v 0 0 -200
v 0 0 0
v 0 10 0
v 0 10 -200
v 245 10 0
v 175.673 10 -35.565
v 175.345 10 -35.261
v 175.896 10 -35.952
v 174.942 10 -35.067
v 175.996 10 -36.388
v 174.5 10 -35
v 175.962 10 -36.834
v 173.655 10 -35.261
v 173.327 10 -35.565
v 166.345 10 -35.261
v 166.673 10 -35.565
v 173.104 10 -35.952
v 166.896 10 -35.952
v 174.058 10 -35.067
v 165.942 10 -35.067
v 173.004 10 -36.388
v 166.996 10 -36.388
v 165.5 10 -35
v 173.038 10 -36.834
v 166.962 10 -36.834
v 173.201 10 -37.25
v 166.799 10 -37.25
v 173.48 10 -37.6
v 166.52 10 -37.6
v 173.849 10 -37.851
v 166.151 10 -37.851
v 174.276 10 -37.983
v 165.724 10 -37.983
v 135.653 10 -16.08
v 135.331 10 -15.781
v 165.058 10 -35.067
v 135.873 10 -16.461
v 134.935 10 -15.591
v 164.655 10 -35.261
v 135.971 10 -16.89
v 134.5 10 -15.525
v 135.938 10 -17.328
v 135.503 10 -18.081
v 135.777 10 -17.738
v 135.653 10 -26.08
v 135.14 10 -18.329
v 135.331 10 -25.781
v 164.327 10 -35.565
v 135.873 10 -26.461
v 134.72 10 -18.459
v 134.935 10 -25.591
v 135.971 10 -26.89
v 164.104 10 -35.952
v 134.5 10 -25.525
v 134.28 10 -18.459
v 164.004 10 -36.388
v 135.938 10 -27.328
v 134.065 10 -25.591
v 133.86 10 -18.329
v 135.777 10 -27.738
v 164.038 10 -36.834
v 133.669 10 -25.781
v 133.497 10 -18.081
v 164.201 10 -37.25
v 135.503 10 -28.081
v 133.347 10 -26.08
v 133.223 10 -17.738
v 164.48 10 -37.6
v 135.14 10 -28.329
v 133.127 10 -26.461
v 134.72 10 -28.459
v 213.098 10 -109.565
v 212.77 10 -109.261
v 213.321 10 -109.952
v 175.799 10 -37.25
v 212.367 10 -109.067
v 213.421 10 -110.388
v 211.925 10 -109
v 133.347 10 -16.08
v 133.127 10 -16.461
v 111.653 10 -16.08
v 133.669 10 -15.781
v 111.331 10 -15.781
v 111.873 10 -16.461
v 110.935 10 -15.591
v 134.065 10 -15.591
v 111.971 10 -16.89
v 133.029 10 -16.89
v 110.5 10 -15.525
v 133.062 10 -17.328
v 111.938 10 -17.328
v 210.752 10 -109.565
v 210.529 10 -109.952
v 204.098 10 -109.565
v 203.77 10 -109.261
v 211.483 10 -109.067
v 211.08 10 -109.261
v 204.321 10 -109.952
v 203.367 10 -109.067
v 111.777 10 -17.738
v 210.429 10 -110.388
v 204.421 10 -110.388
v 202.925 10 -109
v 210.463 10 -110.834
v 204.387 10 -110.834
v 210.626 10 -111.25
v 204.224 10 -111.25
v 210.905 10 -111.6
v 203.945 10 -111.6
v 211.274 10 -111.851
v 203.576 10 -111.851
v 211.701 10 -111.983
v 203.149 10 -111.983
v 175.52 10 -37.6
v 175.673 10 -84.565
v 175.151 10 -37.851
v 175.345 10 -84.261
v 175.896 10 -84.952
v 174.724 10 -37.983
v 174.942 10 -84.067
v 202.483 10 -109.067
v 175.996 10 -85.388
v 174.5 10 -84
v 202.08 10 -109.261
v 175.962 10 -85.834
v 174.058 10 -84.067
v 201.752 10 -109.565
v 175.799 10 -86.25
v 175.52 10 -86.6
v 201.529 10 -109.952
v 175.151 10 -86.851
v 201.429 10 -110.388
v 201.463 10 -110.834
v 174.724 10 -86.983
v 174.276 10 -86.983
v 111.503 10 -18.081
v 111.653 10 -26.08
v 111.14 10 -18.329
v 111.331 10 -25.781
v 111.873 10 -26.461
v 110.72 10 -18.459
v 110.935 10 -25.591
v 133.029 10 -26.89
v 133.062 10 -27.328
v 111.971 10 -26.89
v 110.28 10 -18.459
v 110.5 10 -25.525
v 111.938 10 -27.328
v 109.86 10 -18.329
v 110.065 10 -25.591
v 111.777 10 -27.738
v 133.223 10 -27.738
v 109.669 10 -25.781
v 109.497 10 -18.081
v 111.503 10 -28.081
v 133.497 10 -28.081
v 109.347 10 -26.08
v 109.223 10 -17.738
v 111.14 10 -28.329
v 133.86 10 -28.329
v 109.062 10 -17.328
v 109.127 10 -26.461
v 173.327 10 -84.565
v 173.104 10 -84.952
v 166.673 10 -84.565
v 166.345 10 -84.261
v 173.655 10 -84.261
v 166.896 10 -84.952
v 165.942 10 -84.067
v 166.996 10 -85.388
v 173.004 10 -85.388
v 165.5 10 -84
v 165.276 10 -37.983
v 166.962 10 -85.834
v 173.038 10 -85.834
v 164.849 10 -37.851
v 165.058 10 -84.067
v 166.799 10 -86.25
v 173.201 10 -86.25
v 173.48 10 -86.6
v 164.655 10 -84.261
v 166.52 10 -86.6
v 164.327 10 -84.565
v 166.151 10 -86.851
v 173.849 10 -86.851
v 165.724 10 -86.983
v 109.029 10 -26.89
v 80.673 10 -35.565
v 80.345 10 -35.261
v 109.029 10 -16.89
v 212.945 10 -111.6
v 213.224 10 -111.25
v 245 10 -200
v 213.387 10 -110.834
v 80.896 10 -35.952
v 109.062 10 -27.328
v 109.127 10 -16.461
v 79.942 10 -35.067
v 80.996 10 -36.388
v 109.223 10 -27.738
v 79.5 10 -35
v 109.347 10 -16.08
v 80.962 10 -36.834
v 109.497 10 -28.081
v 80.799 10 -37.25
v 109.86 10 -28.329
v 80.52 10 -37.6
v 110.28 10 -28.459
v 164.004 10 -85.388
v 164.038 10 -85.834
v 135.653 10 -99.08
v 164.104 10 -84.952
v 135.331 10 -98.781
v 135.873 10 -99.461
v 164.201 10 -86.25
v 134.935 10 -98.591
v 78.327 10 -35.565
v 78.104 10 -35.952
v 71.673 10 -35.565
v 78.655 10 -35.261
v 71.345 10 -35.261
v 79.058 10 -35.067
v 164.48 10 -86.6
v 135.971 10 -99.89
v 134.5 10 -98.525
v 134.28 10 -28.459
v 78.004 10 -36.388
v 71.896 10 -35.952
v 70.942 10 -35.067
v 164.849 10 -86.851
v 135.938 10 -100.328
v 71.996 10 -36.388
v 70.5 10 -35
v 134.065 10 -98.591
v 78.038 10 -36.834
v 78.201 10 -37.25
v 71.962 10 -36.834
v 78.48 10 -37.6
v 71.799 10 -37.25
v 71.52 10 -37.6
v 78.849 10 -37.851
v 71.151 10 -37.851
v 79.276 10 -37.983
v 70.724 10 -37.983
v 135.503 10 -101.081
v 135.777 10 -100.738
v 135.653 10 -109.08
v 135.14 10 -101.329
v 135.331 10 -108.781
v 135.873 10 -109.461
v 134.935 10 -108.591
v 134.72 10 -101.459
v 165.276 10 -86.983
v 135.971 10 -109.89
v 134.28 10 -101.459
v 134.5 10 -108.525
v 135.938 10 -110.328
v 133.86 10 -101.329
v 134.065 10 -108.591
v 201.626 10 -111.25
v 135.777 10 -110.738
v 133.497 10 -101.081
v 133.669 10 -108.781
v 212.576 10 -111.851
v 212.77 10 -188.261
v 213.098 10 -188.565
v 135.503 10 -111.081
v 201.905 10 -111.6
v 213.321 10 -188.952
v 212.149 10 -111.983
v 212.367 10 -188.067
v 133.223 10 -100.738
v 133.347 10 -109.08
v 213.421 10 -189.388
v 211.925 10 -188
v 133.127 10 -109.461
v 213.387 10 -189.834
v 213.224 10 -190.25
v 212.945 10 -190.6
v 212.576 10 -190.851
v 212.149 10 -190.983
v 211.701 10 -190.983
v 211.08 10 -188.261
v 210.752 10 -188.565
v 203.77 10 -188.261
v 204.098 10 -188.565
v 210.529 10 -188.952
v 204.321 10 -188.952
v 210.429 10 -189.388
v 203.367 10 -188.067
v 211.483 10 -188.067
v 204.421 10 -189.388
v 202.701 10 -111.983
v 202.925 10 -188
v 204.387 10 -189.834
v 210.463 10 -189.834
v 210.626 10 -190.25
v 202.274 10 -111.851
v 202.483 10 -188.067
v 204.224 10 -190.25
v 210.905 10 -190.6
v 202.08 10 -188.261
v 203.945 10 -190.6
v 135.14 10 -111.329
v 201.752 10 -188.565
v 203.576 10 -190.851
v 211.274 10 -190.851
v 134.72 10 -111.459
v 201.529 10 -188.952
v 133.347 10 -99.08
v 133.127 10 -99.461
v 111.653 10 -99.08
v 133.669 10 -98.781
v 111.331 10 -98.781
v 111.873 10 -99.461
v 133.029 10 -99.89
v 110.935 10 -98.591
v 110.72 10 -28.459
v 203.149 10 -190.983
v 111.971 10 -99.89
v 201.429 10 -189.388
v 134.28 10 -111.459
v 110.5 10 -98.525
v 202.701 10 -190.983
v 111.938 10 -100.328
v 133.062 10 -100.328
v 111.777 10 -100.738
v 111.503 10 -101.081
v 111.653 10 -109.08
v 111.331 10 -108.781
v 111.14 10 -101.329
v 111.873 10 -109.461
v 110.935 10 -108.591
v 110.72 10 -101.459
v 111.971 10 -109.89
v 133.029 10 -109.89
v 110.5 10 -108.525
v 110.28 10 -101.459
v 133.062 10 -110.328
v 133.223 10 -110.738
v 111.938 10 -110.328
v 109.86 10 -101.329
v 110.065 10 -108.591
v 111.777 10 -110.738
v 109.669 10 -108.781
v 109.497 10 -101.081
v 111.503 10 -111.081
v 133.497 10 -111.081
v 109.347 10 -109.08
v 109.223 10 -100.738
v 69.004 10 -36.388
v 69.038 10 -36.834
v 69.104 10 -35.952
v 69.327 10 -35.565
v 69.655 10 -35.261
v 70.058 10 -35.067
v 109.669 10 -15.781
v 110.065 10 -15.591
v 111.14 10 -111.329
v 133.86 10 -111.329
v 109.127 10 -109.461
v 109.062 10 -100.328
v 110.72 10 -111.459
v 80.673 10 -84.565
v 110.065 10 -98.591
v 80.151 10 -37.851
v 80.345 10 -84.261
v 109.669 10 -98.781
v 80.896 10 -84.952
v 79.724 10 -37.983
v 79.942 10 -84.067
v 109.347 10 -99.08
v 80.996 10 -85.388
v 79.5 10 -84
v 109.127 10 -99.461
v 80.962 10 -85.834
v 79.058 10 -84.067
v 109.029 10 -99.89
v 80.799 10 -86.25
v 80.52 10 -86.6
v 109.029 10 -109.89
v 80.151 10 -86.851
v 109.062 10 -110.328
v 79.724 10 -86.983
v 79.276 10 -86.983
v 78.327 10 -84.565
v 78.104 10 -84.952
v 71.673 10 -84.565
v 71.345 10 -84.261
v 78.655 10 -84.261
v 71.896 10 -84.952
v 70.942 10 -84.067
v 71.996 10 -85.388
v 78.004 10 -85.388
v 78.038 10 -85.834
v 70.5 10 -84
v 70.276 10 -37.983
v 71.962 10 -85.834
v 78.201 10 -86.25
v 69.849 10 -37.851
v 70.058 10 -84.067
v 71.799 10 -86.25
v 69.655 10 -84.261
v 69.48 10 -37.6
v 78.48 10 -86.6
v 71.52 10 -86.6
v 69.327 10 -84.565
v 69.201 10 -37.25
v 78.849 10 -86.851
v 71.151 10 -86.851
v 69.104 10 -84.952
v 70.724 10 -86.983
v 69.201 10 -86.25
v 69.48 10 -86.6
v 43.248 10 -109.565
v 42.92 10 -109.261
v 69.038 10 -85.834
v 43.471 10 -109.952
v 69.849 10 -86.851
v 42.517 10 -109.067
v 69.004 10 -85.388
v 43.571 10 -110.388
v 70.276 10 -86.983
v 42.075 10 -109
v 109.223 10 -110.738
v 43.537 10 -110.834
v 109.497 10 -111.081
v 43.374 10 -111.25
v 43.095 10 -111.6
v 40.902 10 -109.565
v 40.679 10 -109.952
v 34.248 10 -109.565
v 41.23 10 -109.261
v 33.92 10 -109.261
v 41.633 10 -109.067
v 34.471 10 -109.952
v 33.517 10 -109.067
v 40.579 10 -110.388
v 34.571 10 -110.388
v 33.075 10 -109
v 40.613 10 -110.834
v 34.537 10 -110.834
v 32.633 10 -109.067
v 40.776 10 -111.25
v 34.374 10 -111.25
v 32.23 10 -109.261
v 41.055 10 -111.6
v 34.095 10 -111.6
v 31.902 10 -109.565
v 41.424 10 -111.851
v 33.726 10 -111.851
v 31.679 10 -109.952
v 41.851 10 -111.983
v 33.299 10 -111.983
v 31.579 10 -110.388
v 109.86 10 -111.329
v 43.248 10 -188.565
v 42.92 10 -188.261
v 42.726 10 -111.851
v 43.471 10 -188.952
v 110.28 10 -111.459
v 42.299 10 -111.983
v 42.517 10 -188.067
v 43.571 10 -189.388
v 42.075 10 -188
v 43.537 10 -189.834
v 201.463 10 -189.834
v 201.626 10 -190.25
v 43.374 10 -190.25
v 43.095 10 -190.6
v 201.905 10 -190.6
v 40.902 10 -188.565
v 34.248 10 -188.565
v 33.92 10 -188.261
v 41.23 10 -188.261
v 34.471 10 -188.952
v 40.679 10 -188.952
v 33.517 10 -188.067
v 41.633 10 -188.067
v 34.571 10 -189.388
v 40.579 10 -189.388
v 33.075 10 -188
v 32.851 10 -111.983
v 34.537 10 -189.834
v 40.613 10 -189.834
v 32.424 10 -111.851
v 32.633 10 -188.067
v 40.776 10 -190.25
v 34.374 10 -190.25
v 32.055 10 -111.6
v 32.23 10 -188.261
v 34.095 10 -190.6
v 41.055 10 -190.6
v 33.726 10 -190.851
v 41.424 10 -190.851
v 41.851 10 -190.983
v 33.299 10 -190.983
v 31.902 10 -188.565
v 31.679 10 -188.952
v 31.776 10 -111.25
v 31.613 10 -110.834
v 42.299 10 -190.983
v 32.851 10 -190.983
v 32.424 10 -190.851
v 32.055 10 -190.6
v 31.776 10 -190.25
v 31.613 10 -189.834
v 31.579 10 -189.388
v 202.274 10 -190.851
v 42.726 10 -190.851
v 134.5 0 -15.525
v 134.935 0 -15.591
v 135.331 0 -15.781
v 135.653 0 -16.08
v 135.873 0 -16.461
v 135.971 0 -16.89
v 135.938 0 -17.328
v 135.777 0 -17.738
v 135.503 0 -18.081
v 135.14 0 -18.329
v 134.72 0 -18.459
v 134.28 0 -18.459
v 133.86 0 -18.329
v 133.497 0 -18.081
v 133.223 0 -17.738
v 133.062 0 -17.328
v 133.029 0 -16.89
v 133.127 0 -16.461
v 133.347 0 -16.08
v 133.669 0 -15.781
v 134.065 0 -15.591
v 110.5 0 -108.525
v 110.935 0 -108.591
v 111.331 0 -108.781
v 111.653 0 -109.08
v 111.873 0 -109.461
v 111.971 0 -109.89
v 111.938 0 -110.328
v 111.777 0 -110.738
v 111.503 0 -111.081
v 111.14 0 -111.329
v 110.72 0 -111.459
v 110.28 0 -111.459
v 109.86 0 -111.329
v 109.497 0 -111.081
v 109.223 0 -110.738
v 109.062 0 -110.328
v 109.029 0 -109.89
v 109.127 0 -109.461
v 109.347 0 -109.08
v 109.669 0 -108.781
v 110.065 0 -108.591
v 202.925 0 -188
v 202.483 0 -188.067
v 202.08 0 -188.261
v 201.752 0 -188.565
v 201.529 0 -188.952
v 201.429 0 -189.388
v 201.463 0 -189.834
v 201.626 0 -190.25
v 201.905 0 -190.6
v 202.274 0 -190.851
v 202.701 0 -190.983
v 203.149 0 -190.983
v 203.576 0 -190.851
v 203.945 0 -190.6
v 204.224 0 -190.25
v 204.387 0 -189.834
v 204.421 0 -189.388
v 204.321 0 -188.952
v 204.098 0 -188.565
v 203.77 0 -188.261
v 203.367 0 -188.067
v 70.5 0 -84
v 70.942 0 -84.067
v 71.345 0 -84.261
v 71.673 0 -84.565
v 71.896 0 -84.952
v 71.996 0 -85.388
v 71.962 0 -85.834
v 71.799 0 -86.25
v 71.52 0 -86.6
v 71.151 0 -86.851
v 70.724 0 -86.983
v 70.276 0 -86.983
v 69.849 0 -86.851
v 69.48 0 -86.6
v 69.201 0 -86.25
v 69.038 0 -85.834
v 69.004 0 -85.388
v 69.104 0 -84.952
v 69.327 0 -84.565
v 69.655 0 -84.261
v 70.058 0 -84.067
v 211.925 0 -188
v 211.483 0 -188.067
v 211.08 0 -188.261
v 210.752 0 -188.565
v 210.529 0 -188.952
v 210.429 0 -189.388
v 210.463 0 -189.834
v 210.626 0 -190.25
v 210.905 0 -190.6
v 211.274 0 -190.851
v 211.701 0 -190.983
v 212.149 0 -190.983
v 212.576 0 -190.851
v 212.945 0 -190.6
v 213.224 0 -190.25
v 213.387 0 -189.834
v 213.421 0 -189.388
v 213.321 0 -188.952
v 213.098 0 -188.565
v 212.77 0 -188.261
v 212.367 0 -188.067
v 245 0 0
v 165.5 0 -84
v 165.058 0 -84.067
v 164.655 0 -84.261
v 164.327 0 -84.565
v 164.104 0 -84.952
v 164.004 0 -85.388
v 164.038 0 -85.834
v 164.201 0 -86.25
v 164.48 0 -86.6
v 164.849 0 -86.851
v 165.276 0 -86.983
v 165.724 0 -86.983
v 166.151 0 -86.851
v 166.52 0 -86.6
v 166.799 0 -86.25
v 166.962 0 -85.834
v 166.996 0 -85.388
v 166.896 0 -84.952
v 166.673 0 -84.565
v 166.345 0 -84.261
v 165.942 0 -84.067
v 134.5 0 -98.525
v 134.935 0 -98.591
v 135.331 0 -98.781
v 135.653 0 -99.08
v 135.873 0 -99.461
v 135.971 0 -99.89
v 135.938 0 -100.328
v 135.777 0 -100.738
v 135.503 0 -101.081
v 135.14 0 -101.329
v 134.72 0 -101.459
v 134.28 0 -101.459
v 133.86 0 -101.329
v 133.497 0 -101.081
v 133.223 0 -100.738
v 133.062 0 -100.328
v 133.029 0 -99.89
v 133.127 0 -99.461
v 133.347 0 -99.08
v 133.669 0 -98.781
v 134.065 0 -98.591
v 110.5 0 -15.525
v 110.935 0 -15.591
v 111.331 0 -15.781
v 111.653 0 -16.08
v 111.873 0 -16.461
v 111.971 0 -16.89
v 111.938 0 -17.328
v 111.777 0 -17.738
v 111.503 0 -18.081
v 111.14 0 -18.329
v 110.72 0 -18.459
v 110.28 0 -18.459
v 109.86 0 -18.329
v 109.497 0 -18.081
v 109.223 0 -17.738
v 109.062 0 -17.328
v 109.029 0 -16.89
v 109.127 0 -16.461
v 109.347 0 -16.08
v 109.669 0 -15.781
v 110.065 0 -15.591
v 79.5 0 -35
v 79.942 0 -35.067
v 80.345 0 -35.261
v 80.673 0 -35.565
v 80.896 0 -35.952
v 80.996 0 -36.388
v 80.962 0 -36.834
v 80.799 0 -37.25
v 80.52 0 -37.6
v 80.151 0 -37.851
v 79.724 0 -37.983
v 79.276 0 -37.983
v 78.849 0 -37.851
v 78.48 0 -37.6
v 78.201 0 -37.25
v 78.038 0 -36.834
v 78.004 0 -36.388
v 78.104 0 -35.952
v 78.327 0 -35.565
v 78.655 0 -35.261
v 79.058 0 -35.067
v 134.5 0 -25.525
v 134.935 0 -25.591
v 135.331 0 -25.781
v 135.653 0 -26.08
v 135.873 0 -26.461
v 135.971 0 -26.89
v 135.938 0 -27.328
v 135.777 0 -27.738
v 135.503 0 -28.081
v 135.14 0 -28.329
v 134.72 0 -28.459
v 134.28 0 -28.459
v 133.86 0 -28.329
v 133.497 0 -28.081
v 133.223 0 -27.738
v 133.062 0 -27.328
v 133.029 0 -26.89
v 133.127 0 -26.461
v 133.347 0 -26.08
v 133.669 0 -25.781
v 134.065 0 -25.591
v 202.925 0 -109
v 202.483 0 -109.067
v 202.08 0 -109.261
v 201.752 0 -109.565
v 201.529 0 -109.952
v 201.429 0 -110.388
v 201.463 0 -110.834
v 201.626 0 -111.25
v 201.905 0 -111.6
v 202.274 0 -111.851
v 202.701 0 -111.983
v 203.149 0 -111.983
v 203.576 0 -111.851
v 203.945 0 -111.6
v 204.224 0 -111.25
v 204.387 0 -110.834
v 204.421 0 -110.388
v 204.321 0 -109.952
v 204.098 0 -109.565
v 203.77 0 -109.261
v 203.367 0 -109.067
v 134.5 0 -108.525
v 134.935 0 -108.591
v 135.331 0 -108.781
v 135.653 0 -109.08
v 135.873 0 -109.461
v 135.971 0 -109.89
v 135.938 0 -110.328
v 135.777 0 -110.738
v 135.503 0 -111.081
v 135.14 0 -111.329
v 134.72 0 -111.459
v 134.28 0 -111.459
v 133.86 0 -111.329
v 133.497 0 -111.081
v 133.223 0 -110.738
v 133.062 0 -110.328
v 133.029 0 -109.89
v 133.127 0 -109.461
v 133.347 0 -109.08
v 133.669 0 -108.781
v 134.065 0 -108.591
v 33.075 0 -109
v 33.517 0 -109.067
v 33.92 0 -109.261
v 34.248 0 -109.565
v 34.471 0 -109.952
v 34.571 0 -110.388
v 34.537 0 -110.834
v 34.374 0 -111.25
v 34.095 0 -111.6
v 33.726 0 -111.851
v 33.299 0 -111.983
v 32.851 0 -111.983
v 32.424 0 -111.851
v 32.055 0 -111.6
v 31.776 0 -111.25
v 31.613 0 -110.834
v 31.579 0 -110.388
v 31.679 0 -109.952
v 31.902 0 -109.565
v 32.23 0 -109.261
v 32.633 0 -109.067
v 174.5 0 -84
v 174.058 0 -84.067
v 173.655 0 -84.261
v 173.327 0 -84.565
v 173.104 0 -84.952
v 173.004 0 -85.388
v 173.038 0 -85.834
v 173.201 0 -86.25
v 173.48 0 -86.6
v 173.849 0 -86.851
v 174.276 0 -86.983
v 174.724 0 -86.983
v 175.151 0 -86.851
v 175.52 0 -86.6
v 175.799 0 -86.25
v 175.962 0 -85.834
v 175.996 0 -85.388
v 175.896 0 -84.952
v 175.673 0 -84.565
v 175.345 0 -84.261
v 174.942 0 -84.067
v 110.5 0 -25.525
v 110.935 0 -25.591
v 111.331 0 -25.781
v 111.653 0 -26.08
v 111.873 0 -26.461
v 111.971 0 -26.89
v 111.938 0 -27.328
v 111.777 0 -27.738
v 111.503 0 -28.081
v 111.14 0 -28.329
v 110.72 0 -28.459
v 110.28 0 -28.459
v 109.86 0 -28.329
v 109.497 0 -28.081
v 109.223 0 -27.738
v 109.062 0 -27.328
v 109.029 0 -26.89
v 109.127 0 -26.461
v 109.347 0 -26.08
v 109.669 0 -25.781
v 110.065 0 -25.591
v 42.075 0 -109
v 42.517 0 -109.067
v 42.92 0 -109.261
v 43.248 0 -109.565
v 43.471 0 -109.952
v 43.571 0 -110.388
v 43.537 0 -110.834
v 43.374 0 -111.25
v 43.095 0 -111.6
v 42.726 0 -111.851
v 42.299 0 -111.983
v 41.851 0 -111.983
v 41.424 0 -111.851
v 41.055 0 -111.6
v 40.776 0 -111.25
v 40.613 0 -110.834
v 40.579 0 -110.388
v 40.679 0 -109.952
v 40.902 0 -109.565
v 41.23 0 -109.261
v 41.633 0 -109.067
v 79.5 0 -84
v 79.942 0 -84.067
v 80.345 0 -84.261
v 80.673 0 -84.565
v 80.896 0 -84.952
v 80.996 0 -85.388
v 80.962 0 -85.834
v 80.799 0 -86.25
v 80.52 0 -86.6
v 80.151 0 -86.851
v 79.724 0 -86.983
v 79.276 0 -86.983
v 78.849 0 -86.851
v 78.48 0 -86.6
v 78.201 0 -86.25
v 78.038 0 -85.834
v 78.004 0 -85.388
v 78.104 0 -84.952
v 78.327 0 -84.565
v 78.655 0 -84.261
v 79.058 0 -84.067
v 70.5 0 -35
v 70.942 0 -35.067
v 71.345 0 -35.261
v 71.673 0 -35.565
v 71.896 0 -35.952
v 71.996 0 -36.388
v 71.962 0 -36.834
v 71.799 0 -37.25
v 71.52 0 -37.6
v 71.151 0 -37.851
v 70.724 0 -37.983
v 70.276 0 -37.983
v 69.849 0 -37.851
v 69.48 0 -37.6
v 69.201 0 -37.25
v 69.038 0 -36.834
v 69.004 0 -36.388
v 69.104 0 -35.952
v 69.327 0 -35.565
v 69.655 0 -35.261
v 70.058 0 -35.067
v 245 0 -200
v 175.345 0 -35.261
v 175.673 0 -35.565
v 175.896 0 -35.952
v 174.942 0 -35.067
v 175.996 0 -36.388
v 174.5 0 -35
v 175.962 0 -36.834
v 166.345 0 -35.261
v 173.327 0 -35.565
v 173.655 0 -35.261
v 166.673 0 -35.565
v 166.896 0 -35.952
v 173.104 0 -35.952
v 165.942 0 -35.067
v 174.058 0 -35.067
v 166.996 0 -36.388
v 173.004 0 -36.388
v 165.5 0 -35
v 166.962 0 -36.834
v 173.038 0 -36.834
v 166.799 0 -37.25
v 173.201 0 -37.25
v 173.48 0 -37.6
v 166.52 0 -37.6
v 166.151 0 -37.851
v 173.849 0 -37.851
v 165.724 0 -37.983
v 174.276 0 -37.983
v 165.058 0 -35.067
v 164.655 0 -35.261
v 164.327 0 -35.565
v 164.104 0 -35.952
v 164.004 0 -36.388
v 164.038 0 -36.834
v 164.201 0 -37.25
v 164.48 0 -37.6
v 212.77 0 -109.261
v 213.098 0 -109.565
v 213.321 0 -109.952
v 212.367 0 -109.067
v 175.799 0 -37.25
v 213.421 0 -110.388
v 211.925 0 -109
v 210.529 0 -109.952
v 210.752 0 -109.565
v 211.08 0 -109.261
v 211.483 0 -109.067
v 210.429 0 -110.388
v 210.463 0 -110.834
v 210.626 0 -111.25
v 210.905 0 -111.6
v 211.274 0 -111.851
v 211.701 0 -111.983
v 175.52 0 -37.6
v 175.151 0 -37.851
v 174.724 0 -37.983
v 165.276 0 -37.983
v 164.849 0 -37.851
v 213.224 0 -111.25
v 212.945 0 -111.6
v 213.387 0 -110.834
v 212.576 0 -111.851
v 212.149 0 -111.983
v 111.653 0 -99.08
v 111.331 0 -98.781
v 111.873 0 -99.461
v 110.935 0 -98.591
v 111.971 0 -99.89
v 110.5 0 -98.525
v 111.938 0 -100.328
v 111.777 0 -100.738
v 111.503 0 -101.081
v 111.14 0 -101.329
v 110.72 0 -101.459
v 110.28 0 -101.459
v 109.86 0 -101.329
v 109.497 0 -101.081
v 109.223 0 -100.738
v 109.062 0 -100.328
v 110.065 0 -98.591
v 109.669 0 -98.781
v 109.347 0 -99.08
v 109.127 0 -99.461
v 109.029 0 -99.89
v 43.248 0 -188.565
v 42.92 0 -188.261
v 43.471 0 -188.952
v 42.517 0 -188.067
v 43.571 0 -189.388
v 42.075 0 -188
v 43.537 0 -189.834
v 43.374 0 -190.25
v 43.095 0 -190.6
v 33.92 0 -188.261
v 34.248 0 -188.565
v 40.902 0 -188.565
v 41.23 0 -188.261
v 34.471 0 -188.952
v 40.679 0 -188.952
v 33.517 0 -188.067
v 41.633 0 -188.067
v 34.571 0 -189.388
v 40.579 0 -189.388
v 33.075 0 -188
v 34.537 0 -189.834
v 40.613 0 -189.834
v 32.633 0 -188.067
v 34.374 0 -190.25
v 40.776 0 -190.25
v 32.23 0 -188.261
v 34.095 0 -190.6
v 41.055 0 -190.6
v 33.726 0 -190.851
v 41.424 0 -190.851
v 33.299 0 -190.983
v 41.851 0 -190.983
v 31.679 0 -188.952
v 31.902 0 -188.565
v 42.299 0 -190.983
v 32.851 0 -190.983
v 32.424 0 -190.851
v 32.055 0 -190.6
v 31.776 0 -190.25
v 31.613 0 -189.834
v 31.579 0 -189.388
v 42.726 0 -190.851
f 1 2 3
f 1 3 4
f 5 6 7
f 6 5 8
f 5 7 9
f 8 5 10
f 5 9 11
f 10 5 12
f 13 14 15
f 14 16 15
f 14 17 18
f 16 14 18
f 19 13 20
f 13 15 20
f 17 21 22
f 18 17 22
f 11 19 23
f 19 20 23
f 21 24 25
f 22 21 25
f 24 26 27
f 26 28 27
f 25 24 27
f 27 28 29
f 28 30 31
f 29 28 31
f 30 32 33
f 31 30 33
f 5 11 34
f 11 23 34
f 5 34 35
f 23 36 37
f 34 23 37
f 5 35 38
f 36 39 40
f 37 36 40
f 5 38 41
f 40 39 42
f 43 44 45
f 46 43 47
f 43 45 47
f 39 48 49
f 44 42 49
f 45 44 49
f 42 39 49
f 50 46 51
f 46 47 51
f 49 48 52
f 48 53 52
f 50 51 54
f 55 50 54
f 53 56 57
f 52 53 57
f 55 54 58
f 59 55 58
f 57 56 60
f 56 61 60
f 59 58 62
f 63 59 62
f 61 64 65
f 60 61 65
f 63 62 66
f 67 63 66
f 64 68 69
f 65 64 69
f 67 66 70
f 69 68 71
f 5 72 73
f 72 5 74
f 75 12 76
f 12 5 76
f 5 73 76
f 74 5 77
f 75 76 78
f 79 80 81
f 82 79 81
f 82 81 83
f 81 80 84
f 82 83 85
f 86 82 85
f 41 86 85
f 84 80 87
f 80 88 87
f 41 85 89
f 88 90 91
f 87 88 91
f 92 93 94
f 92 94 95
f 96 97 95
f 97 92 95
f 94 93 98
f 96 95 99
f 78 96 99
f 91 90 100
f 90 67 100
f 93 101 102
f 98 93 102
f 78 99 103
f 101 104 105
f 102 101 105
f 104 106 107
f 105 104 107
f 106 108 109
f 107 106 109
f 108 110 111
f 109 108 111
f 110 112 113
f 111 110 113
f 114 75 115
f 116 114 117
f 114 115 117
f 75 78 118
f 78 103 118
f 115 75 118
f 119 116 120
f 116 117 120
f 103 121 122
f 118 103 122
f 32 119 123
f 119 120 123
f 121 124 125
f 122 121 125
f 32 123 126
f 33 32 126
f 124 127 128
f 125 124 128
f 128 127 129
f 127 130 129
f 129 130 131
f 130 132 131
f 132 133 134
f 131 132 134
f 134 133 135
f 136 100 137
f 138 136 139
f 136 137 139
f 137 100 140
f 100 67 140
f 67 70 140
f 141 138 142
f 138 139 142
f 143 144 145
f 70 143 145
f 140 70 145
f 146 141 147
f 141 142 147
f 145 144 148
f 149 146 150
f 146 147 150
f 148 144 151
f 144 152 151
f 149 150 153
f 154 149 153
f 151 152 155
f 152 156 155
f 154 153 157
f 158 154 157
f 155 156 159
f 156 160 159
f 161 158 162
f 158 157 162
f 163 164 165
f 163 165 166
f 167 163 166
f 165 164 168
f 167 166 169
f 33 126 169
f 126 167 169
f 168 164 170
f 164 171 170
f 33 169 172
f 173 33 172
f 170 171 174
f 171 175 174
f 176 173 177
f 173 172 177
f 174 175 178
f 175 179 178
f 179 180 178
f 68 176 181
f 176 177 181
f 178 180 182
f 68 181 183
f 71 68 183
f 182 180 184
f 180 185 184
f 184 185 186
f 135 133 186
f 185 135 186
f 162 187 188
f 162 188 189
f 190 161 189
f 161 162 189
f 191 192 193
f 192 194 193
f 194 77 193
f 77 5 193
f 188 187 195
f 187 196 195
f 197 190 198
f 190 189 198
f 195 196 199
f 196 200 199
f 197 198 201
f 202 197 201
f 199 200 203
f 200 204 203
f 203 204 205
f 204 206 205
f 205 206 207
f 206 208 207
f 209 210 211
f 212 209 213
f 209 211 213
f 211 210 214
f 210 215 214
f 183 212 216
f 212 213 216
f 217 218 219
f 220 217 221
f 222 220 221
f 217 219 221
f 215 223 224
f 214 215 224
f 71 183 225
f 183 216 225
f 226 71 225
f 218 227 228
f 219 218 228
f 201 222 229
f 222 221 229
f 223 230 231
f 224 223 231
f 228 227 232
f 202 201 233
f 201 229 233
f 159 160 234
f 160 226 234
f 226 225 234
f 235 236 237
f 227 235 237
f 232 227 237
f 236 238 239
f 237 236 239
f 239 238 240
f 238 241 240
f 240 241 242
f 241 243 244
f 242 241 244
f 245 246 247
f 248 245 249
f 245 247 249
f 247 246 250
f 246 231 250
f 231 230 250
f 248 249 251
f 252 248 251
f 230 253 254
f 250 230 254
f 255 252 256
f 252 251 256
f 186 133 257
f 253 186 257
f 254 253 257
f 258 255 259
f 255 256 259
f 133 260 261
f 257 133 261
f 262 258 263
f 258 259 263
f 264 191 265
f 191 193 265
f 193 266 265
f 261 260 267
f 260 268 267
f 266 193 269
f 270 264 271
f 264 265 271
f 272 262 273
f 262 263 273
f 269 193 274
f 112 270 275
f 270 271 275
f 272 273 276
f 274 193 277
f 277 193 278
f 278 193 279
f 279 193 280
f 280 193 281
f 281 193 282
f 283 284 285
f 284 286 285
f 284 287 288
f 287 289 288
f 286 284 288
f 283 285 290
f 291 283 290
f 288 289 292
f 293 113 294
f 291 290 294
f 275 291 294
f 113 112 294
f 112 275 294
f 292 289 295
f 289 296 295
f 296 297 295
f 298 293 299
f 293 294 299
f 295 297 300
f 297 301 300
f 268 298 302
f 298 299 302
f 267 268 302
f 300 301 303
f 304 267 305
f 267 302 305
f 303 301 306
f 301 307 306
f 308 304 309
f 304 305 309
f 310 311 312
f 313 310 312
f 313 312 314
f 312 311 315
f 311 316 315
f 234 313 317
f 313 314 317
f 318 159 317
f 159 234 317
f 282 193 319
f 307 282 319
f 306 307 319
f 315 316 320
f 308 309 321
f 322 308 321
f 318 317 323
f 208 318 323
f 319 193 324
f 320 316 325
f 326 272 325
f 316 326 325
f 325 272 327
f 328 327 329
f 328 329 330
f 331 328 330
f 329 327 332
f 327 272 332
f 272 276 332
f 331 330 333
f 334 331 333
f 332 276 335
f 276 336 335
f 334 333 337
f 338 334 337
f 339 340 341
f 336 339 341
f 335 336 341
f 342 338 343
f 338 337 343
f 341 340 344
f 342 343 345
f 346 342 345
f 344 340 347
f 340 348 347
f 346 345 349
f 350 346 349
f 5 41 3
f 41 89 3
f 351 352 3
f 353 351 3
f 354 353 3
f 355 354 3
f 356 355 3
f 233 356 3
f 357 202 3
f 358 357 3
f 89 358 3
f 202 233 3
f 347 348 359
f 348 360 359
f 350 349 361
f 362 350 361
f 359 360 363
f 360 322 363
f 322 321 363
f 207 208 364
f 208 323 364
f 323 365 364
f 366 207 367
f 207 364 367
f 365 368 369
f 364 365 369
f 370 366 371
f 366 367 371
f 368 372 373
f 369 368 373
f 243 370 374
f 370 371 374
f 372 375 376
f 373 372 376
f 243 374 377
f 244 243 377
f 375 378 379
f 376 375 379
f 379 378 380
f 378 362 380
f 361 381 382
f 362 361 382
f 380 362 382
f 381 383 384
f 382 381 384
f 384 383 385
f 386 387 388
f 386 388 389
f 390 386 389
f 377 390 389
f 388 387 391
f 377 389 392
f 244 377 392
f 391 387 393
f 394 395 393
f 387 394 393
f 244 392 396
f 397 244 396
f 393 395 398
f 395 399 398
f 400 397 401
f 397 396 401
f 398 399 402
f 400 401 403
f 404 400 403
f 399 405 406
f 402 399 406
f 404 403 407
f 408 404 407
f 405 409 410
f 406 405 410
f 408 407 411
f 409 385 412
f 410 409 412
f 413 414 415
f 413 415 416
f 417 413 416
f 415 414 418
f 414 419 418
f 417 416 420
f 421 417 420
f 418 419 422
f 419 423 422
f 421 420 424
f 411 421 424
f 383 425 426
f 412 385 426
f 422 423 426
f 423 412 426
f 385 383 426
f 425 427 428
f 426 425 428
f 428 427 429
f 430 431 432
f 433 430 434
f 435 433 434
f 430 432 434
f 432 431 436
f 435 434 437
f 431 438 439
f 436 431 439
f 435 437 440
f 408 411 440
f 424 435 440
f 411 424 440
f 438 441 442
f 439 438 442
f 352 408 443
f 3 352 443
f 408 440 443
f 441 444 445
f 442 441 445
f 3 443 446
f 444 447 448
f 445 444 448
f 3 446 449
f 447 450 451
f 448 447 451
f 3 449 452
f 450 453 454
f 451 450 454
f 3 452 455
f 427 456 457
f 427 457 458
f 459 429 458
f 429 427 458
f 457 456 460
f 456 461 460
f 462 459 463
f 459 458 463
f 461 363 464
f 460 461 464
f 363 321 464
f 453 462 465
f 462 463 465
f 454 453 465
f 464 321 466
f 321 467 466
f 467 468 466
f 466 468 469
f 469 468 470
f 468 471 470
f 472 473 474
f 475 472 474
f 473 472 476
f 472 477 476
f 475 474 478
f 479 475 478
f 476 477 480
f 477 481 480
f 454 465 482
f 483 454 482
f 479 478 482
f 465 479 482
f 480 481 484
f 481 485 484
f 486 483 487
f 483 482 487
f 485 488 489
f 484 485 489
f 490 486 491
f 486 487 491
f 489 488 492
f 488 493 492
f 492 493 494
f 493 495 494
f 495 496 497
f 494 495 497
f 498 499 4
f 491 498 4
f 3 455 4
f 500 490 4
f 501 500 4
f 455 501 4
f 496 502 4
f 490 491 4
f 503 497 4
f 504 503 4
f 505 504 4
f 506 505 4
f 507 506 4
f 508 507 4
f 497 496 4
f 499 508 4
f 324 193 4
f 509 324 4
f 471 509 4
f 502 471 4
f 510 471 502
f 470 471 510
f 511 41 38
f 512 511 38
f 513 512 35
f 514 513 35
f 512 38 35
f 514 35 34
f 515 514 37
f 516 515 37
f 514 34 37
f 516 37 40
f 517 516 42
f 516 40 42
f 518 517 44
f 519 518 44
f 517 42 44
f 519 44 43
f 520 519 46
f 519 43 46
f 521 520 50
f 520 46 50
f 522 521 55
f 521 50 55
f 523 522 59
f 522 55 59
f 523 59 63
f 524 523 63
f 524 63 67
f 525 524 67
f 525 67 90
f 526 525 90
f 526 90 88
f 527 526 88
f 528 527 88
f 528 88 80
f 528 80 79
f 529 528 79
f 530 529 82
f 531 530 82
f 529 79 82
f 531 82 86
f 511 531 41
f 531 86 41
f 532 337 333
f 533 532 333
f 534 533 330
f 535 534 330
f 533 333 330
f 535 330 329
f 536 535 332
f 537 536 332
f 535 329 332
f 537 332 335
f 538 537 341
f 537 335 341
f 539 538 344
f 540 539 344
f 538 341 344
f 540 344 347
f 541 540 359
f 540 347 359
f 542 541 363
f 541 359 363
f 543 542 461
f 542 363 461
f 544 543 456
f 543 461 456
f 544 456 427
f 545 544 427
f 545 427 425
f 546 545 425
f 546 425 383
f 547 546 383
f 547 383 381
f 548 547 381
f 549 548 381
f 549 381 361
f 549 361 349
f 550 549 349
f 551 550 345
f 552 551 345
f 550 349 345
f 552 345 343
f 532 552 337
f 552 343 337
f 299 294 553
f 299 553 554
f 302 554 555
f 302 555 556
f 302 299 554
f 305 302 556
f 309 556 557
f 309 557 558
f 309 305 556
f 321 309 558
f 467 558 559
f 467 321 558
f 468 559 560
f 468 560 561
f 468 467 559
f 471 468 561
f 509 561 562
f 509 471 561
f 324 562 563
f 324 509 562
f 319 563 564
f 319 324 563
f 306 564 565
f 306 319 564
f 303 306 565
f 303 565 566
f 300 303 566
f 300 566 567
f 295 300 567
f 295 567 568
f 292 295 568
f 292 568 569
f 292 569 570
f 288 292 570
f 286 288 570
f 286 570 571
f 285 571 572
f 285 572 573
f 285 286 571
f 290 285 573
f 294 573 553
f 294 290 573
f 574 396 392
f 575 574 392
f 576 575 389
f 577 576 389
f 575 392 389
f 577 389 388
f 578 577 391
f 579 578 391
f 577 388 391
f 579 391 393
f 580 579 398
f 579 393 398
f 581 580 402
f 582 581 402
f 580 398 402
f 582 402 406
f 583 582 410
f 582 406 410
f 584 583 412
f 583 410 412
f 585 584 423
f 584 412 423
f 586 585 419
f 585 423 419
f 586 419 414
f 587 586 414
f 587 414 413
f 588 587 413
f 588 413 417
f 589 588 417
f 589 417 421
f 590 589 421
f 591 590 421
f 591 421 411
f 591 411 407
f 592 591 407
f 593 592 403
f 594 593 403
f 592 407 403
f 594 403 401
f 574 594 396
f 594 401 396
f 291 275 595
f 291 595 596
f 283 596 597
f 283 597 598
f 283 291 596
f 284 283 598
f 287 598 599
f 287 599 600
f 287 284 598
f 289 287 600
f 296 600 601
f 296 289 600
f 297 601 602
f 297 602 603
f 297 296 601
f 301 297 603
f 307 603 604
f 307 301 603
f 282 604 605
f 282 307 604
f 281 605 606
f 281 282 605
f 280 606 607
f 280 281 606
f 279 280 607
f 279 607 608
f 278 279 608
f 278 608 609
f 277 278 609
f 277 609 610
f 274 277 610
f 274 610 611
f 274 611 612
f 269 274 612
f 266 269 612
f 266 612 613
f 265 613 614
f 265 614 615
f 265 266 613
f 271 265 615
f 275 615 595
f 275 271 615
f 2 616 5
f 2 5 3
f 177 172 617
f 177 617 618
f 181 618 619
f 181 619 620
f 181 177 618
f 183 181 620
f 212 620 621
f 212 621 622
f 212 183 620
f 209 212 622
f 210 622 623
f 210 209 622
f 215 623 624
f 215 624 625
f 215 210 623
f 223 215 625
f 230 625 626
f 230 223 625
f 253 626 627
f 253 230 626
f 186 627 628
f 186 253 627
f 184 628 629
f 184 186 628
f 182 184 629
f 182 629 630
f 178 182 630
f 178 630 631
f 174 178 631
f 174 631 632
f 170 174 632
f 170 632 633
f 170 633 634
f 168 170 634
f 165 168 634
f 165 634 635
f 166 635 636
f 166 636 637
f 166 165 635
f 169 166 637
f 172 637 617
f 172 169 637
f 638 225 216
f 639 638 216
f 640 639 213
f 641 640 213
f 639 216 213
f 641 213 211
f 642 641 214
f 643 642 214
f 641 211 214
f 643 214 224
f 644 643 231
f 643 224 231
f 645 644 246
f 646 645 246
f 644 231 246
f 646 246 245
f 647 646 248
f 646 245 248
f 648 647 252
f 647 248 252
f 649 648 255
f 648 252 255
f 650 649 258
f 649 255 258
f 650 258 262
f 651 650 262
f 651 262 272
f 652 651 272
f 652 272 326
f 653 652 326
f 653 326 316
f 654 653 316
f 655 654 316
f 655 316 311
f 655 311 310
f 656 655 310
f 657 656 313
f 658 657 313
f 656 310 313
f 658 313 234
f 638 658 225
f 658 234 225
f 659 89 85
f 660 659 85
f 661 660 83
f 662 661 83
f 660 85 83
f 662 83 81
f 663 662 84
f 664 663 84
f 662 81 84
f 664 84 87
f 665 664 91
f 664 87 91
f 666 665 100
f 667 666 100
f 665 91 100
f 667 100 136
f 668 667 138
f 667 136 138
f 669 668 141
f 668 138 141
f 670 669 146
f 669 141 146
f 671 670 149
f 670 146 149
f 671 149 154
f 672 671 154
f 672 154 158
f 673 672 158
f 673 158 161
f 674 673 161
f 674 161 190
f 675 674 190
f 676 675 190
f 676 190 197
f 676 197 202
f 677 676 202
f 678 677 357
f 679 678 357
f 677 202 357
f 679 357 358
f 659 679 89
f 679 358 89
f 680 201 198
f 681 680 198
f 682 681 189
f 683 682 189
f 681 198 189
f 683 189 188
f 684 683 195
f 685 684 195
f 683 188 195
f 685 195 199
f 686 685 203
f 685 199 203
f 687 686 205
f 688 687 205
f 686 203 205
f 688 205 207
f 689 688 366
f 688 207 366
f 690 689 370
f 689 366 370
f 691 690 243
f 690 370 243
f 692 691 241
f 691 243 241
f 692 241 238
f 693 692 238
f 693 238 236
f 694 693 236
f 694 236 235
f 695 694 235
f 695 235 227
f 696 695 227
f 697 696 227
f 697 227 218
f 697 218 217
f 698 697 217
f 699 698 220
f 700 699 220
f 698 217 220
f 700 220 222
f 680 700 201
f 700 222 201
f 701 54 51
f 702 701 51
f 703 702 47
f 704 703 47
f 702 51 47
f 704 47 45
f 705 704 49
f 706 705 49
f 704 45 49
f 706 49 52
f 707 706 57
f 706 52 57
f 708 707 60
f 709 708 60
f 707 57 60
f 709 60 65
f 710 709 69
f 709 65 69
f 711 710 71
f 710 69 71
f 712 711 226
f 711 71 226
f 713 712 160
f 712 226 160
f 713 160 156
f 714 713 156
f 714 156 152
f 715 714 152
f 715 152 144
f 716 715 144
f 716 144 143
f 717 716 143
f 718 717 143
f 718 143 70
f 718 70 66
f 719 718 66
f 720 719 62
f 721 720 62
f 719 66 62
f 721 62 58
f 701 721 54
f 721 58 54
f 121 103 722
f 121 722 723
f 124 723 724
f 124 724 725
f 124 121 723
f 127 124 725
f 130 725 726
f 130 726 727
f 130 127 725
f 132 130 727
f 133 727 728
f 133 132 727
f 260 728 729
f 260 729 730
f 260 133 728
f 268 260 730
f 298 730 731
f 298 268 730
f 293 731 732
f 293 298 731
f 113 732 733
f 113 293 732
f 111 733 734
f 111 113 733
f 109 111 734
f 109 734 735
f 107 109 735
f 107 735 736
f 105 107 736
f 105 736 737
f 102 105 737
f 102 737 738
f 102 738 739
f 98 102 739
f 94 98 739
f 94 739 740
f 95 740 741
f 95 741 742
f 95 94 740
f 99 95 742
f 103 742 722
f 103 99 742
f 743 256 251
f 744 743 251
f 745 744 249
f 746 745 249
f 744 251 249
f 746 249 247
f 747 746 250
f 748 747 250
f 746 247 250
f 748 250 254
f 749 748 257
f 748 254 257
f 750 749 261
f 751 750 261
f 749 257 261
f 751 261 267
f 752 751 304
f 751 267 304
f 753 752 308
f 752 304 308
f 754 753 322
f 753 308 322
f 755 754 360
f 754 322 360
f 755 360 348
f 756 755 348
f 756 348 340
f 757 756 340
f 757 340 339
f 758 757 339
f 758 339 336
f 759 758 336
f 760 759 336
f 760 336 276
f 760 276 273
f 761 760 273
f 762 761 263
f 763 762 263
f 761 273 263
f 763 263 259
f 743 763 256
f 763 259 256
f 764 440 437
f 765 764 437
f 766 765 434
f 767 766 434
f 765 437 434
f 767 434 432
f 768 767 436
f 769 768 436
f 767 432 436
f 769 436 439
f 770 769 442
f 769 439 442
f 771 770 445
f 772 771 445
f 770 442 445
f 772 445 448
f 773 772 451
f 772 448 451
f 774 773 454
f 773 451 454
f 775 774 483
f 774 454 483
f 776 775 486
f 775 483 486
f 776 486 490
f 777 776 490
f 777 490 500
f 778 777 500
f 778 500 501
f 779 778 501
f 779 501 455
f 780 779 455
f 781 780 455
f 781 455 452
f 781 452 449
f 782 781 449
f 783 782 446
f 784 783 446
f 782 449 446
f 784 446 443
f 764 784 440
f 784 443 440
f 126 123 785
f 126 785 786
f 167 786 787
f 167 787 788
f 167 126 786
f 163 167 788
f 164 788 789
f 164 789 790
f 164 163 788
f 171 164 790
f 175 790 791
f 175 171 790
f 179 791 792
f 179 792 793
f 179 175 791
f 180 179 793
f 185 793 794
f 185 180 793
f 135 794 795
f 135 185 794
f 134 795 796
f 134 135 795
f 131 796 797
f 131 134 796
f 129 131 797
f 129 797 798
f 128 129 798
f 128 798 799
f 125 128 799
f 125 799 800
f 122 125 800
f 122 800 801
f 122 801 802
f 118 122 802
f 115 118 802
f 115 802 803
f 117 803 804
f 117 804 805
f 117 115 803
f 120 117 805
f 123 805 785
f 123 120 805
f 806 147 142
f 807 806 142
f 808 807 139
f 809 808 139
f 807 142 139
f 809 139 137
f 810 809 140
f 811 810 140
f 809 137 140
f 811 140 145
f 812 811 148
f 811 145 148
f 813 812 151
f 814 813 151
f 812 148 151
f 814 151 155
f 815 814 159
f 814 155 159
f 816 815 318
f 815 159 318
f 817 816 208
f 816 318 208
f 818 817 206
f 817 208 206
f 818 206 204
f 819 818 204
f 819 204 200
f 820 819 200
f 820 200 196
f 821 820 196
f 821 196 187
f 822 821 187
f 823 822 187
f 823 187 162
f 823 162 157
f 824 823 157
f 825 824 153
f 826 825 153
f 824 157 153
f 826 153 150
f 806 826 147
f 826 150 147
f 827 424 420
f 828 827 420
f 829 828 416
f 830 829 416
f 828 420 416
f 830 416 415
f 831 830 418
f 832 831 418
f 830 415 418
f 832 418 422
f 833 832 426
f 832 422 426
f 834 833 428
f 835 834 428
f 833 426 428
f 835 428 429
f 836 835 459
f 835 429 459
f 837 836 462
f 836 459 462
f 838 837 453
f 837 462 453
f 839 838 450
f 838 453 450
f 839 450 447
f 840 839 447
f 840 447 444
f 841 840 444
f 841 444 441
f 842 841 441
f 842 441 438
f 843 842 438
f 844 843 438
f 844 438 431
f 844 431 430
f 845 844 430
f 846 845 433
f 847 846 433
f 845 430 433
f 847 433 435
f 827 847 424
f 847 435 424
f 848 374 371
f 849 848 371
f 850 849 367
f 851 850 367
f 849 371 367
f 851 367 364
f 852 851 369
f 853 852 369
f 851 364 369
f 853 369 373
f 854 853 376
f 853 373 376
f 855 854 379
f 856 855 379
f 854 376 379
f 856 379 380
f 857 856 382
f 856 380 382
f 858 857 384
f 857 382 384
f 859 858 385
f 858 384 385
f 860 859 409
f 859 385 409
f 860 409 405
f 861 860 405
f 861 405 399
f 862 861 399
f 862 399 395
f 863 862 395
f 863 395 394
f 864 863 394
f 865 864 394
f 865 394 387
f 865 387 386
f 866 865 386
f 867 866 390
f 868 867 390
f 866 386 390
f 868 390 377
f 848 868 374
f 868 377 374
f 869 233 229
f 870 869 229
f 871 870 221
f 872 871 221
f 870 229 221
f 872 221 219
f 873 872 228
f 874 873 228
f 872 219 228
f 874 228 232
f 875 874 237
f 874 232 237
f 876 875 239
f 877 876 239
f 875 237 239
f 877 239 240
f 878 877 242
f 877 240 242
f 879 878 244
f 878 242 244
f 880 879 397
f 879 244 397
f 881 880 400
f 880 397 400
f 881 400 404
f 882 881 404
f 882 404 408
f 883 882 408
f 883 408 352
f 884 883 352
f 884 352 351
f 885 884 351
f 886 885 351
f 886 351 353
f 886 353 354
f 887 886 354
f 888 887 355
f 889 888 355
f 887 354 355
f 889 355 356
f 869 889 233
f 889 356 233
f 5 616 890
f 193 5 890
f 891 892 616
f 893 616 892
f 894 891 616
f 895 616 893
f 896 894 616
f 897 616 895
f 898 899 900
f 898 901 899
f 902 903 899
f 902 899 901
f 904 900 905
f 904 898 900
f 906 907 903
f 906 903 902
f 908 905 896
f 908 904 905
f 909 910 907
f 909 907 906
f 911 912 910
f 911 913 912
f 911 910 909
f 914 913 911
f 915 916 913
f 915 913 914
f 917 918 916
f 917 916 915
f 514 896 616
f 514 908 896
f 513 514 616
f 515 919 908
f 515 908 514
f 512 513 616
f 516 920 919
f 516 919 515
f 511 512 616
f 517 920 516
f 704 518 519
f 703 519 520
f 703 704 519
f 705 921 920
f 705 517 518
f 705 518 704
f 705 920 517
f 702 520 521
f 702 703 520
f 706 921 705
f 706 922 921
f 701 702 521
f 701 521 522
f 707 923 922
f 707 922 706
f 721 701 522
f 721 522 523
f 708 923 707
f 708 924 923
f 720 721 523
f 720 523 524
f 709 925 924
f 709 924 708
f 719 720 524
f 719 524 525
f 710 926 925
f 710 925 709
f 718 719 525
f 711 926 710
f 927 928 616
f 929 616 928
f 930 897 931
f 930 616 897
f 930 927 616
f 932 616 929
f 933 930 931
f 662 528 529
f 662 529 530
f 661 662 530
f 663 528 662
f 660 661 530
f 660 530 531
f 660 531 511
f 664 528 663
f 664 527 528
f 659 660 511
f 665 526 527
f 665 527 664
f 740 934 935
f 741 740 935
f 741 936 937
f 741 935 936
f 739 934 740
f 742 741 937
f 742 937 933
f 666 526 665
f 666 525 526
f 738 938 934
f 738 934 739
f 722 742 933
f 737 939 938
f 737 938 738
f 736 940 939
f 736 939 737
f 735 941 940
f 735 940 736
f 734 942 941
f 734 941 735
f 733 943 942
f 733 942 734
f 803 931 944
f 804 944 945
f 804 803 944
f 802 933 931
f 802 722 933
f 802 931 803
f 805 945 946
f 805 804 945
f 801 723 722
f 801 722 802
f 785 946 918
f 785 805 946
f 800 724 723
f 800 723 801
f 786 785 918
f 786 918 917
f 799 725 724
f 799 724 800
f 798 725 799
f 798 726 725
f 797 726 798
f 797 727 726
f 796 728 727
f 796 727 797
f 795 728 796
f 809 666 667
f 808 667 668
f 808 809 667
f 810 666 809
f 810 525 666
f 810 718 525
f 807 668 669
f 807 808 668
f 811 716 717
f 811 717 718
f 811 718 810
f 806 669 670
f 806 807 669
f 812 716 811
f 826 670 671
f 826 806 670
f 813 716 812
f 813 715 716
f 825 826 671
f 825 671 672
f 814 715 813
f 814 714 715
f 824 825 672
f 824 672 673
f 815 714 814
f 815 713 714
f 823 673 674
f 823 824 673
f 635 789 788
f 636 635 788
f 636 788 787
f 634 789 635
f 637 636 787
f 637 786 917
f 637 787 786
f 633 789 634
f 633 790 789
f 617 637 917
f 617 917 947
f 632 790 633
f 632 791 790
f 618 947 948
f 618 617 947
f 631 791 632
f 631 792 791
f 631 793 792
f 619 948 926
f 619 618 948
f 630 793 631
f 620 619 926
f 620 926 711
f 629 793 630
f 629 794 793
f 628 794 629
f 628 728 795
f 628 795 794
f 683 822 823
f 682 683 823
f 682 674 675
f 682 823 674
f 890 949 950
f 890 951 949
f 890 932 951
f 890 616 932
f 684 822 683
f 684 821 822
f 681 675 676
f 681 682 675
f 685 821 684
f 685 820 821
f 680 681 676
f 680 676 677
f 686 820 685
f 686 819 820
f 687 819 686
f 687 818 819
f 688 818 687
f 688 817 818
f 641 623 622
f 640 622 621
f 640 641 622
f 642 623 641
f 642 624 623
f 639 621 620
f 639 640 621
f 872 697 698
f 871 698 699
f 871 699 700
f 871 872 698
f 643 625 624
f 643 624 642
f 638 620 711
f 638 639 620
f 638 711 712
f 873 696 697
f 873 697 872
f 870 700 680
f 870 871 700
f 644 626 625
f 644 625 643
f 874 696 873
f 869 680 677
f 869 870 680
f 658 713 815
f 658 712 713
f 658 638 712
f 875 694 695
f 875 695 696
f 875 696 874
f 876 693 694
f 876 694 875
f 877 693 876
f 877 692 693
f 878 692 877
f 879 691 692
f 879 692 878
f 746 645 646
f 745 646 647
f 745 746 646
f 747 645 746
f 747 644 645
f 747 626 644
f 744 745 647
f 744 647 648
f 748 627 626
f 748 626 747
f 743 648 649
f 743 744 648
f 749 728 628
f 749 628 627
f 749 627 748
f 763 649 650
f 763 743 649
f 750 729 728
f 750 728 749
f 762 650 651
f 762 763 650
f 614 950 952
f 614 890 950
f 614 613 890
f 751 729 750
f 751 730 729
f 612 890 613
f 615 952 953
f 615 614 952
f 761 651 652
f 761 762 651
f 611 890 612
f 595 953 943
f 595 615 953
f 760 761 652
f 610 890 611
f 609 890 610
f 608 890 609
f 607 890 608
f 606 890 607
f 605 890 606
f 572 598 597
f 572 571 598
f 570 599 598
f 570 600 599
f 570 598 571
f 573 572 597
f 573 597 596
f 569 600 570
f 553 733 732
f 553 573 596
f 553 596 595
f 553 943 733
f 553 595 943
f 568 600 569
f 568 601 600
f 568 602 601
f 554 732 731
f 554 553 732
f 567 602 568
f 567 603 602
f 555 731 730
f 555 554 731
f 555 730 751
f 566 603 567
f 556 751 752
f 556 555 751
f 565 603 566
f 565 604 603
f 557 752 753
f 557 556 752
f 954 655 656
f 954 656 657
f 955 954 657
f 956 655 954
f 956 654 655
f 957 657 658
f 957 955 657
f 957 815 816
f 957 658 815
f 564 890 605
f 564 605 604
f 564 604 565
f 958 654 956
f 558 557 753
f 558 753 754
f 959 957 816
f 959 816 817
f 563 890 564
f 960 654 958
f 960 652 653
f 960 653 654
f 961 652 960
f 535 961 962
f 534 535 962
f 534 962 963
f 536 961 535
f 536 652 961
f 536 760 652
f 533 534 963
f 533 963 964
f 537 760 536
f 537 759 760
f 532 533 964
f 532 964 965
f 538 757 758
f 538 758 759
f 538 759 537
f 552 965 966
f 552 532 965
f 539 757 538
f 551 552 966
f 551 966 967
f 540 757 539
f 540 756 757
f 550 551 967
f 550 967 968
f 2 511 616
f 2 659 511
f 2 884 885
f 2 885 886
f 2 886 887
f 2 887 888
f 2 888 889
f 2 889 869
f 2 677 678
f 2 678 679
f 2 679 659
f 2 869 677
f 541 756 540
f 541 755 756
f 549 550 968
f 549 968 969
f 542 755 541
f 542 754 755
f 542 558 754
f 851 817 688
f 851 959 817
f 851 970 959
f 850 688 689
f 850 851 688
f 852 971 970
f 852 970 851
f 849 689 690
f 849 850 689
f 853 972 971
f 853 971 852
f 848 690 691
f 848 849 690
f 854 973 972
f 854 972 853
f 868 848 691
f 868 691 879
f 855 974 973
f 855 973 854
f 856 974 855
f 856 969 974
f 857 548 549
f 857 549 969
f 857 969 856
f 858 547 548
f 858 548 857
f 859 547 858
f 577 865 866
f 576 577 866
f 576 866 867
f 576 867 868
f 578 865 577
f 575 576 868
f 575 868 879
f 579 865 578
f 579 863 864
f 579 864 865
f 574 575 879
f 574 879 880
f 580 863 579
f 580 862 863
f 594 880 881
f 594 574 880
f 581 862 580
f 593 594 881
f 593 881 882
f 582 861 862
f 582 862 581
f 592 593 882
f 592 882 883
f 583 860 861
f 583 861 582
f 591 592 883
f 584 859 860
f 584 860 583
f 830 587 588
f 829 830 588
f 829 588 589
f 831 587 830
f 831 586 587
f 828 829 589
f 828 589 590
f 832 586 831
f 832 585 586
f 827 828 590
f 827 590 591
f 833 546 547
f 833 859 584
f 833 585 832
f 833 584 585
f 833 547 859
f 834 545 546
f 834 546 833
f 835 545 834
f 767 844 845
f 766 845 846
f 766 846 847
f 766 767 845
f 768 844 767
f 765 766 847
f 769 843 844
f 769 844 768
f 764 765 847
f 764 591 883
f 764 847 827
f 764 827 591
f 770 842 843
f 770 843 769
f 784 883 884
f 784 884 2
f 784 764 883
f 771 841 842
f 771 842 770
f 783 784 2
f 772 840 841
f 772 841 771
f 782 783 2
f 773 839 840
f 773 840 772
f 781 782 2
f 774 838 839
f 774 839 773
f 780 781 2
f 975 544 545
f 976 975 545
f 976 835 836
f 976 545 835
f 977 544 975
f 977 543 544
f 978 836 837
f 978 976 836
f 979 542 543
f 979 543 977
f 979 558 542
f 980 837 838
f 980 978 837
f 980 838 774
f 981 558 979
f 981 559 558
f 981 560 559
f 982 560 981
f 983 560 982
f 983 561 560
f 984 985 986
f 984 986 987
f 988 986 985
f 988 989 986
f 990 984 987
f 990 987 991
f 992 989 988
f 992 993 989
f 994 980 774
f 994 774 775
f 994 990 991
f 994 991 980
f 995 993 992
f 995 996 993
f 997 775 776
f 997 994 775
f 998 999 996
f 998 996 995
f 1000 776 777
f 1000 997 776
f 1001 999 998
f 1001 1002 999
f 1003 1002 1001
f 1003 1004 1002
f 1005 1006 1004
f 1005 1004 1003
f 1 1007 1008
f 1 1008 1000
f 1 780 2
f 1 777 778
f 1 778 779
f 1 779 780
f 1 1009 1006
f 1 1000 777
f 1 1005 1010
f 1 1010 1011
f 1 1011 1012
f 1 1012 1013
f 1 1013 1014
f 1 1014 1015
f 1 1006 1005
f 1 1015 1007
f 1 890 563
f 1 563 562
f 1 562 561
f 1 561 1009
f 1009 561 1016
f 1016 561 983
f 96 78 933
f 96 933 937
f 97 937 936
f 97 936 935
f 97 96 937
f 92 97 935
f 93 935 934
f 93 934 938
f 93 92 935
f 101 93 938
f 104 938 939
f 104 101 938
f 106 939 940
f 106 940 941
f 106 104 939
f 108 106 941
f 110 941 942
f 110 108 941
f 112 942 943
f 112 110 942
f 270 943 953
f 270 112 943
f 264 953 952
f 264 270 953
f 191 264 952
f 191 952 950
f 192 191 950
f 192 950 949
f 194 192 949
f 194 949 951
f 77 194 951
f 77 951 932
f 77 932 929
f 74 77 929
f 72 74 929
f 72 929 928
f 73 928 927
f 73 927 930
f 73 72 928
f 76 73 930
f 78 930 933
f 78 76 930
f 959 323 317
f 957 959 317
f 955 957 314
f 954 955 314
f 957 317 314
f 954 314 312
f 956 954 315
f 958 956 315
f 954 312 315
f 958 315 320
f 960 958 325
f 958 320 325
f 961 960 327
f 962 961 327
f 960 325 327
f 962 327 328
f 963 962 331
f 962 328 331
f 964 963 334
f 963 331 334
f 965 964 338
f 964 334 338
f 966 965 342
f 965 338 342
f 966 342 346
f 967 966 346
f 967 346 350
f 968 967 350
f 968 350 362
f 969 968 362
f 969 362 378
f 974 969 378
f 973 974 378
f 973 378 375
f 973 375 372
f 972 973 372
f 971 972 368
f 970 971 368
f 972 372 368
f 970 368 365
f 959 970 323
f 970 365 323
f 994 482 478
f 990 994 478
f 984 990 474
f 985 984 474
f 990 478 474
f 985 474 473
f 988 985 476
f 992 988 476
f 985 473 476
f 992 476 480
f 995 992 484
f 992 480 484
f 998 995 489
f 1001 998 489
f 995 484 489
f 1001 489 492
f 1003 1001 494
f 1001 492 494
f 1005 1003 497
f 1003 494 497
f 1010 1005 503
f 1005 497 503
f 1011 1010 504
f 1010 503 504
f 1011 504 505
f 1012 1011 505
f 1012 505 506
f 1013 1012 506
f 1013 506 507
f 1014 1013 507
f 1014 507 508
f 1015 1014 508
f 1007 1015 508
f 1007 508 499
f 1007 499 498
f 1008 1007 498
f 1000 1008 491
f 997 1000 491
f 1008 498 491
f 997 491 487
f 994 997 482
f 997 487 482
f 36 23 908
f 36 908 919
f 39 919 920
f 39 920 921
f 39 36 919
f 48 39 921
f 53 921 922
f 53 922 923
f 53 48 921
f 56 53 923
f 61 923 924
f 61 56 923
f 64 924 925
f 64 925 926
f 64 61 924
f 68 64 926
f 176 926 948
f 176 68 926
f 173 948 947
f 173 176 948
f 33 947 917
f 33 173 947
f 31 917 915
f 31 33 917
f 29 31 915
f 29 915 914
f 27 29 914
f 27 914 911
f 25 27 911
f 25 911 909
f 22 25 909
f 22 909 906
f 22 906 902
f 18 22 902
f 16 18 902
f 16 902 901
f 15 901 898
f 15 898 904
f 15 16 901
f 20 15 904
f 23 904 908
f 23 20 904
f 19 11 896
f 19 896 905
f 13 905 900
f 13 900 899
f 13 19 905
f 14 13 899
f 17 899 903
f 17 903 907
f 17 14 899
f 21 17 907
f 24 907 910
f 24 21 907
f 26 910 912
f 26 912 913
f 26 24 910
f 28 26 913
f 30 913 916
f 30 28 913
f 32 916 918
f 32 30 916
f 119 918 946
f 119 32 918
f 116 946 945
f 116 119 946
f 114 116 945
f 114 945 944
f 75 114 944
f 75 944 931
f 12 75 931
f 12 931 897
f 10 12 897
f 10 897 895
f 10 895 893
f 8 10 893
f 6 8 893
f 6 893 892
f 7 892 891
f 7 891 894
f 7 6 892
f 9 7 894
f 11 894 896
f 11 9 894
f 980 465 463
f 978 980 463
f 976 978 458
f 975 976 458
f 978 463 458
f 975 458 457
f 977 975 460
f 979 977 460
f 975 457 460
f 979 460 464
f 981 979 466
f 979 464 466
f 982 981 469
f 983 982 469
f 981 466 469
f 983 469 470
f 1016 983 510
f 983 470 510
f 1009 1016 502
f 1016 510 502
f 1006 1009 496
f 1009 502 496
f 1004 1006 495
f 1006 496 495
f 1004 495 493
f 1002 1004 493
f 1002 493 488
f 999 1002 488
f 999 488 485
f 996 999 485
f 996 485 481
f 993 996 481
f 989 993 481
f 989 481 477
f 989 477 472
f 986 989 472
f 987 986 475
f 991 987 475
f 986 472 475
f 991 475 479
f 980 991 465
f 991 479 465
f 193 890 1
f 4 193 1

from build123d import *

# Parameters (mm, degrees)
SKETCH1_W           = 122.5
SKETCH1_H           = 200
BOSS_EXTRUDE1_DEPTH = 10
SKETCH4_R           = 1.5
CUT_EXTRUDE2_DEPTH  = 10
SKETCH5_R           = 1.475
CUT_EXTRUDE3_DEPTH  = 10


with BuildPart() as part:
    # Sketch1 → Boss-Extrude1 (new body)
    with BuildSketch(Plane(origin=(0, 0, 0), x_dir=(1, 0, 0), z_dir=(0, 1, 0))):
        with Locations((61.25, 100)):
            Rectangle(SKETCH1_W, SKETCH1_H)
    extrude(amount=BOSS_EXTRUDE1_DEPTH)

    # Sketch4 → Cut-Extrude2 (cut)
    with BuildSketch(Plane(origin=(0, 10, 0), x_dir=(1, 0, 0), z_dir=(0, 1, 0))):
        with Locations(Location((33.075, 189.5, 0), (0, 0, 270))):
            Circle(SKETCH4_R)
        with Locations(Location((42.075, 189.5, 0), (0, 0, 270))):
            Circle(SKETCH4_R)
        with Locations(Location((33.075, 110.5, 0), (0, 0, 270))):
            Circle(SKETCH4_R)
        with Locations(Location((42.075, 110.5, 0), (0, 0, 270))):
            Circle(SKETCH4_R)
        with Locations(Location((70.5, 85.5, 0), (0, 0, 270))):
            Circle(SKETCH4_R)
        with Locations(Location((79.5, 85.5, 0), (0, 0, 270))):
            Circle(SKETCH4_R)
        with Locations(Location((70.5, 36.5, 0), (0, 0, 270))):
            Circle(SKETCH4_R)
        with Locations(Location((79.5, 36.5, 0), (0, 0, 270))):
            Circle(SKETCH4_R)
    extrude(amount=-CUT_EXTRUDE2_DEPTH, mode=Mode.SUBTRACT)

    # Mirror1: part across plane


with BuildPart() as part_1:
    add(part.part)
    add(part.part.mirror(Plane(origin=(122.5, 10, 0), x_dir=(0, 0, 1), z_dir=(-1, 0, 0))))

    # Sketch5 → Cut-Extrude3 (cut)
    with BuildSketch(Plane(origin=(0, 10, 0), x_dir=(1, 0, 0), z_dir=(0, 1, 0))):
        with Locations(Location((134.5, 110, 0), (0, 0, 270))):
            Circle(SKETCH5_R)
        with Locations(Location((110.5, 110, 0), (0, 0, 270))):
            Circle(SKETCH5_R)
        with Locations(Location((110.5, 100, 0), (0, 0, 270))):
            Circle(SKETCH5_R)
        with Locations(Location((134.5, 100, 0), (0, 0, 270))):
            Circle(SKETCH5_R)
        with Locations(Location((110.5, 27, 0), (0, 0, 270))):
            Circle(SKETCH5_R)
        with Locations(Location((134.5, 27, 0), (0, 0, 270))):
            Circle(SKETCH5_R)
        with Locations(Location((134.5, 17, 0), (0, 0, 270))):
            Circle(SKETCH5_R)
        with Locations(Location((110.5, 17, 0), (0, 0, 270))):
            Circle(SKETCH5_R)
    extrude(amount=-CUT_EXTRUDE3_DEPTH, mode=Mode.SUBTRACT)


solid = part_1.part
